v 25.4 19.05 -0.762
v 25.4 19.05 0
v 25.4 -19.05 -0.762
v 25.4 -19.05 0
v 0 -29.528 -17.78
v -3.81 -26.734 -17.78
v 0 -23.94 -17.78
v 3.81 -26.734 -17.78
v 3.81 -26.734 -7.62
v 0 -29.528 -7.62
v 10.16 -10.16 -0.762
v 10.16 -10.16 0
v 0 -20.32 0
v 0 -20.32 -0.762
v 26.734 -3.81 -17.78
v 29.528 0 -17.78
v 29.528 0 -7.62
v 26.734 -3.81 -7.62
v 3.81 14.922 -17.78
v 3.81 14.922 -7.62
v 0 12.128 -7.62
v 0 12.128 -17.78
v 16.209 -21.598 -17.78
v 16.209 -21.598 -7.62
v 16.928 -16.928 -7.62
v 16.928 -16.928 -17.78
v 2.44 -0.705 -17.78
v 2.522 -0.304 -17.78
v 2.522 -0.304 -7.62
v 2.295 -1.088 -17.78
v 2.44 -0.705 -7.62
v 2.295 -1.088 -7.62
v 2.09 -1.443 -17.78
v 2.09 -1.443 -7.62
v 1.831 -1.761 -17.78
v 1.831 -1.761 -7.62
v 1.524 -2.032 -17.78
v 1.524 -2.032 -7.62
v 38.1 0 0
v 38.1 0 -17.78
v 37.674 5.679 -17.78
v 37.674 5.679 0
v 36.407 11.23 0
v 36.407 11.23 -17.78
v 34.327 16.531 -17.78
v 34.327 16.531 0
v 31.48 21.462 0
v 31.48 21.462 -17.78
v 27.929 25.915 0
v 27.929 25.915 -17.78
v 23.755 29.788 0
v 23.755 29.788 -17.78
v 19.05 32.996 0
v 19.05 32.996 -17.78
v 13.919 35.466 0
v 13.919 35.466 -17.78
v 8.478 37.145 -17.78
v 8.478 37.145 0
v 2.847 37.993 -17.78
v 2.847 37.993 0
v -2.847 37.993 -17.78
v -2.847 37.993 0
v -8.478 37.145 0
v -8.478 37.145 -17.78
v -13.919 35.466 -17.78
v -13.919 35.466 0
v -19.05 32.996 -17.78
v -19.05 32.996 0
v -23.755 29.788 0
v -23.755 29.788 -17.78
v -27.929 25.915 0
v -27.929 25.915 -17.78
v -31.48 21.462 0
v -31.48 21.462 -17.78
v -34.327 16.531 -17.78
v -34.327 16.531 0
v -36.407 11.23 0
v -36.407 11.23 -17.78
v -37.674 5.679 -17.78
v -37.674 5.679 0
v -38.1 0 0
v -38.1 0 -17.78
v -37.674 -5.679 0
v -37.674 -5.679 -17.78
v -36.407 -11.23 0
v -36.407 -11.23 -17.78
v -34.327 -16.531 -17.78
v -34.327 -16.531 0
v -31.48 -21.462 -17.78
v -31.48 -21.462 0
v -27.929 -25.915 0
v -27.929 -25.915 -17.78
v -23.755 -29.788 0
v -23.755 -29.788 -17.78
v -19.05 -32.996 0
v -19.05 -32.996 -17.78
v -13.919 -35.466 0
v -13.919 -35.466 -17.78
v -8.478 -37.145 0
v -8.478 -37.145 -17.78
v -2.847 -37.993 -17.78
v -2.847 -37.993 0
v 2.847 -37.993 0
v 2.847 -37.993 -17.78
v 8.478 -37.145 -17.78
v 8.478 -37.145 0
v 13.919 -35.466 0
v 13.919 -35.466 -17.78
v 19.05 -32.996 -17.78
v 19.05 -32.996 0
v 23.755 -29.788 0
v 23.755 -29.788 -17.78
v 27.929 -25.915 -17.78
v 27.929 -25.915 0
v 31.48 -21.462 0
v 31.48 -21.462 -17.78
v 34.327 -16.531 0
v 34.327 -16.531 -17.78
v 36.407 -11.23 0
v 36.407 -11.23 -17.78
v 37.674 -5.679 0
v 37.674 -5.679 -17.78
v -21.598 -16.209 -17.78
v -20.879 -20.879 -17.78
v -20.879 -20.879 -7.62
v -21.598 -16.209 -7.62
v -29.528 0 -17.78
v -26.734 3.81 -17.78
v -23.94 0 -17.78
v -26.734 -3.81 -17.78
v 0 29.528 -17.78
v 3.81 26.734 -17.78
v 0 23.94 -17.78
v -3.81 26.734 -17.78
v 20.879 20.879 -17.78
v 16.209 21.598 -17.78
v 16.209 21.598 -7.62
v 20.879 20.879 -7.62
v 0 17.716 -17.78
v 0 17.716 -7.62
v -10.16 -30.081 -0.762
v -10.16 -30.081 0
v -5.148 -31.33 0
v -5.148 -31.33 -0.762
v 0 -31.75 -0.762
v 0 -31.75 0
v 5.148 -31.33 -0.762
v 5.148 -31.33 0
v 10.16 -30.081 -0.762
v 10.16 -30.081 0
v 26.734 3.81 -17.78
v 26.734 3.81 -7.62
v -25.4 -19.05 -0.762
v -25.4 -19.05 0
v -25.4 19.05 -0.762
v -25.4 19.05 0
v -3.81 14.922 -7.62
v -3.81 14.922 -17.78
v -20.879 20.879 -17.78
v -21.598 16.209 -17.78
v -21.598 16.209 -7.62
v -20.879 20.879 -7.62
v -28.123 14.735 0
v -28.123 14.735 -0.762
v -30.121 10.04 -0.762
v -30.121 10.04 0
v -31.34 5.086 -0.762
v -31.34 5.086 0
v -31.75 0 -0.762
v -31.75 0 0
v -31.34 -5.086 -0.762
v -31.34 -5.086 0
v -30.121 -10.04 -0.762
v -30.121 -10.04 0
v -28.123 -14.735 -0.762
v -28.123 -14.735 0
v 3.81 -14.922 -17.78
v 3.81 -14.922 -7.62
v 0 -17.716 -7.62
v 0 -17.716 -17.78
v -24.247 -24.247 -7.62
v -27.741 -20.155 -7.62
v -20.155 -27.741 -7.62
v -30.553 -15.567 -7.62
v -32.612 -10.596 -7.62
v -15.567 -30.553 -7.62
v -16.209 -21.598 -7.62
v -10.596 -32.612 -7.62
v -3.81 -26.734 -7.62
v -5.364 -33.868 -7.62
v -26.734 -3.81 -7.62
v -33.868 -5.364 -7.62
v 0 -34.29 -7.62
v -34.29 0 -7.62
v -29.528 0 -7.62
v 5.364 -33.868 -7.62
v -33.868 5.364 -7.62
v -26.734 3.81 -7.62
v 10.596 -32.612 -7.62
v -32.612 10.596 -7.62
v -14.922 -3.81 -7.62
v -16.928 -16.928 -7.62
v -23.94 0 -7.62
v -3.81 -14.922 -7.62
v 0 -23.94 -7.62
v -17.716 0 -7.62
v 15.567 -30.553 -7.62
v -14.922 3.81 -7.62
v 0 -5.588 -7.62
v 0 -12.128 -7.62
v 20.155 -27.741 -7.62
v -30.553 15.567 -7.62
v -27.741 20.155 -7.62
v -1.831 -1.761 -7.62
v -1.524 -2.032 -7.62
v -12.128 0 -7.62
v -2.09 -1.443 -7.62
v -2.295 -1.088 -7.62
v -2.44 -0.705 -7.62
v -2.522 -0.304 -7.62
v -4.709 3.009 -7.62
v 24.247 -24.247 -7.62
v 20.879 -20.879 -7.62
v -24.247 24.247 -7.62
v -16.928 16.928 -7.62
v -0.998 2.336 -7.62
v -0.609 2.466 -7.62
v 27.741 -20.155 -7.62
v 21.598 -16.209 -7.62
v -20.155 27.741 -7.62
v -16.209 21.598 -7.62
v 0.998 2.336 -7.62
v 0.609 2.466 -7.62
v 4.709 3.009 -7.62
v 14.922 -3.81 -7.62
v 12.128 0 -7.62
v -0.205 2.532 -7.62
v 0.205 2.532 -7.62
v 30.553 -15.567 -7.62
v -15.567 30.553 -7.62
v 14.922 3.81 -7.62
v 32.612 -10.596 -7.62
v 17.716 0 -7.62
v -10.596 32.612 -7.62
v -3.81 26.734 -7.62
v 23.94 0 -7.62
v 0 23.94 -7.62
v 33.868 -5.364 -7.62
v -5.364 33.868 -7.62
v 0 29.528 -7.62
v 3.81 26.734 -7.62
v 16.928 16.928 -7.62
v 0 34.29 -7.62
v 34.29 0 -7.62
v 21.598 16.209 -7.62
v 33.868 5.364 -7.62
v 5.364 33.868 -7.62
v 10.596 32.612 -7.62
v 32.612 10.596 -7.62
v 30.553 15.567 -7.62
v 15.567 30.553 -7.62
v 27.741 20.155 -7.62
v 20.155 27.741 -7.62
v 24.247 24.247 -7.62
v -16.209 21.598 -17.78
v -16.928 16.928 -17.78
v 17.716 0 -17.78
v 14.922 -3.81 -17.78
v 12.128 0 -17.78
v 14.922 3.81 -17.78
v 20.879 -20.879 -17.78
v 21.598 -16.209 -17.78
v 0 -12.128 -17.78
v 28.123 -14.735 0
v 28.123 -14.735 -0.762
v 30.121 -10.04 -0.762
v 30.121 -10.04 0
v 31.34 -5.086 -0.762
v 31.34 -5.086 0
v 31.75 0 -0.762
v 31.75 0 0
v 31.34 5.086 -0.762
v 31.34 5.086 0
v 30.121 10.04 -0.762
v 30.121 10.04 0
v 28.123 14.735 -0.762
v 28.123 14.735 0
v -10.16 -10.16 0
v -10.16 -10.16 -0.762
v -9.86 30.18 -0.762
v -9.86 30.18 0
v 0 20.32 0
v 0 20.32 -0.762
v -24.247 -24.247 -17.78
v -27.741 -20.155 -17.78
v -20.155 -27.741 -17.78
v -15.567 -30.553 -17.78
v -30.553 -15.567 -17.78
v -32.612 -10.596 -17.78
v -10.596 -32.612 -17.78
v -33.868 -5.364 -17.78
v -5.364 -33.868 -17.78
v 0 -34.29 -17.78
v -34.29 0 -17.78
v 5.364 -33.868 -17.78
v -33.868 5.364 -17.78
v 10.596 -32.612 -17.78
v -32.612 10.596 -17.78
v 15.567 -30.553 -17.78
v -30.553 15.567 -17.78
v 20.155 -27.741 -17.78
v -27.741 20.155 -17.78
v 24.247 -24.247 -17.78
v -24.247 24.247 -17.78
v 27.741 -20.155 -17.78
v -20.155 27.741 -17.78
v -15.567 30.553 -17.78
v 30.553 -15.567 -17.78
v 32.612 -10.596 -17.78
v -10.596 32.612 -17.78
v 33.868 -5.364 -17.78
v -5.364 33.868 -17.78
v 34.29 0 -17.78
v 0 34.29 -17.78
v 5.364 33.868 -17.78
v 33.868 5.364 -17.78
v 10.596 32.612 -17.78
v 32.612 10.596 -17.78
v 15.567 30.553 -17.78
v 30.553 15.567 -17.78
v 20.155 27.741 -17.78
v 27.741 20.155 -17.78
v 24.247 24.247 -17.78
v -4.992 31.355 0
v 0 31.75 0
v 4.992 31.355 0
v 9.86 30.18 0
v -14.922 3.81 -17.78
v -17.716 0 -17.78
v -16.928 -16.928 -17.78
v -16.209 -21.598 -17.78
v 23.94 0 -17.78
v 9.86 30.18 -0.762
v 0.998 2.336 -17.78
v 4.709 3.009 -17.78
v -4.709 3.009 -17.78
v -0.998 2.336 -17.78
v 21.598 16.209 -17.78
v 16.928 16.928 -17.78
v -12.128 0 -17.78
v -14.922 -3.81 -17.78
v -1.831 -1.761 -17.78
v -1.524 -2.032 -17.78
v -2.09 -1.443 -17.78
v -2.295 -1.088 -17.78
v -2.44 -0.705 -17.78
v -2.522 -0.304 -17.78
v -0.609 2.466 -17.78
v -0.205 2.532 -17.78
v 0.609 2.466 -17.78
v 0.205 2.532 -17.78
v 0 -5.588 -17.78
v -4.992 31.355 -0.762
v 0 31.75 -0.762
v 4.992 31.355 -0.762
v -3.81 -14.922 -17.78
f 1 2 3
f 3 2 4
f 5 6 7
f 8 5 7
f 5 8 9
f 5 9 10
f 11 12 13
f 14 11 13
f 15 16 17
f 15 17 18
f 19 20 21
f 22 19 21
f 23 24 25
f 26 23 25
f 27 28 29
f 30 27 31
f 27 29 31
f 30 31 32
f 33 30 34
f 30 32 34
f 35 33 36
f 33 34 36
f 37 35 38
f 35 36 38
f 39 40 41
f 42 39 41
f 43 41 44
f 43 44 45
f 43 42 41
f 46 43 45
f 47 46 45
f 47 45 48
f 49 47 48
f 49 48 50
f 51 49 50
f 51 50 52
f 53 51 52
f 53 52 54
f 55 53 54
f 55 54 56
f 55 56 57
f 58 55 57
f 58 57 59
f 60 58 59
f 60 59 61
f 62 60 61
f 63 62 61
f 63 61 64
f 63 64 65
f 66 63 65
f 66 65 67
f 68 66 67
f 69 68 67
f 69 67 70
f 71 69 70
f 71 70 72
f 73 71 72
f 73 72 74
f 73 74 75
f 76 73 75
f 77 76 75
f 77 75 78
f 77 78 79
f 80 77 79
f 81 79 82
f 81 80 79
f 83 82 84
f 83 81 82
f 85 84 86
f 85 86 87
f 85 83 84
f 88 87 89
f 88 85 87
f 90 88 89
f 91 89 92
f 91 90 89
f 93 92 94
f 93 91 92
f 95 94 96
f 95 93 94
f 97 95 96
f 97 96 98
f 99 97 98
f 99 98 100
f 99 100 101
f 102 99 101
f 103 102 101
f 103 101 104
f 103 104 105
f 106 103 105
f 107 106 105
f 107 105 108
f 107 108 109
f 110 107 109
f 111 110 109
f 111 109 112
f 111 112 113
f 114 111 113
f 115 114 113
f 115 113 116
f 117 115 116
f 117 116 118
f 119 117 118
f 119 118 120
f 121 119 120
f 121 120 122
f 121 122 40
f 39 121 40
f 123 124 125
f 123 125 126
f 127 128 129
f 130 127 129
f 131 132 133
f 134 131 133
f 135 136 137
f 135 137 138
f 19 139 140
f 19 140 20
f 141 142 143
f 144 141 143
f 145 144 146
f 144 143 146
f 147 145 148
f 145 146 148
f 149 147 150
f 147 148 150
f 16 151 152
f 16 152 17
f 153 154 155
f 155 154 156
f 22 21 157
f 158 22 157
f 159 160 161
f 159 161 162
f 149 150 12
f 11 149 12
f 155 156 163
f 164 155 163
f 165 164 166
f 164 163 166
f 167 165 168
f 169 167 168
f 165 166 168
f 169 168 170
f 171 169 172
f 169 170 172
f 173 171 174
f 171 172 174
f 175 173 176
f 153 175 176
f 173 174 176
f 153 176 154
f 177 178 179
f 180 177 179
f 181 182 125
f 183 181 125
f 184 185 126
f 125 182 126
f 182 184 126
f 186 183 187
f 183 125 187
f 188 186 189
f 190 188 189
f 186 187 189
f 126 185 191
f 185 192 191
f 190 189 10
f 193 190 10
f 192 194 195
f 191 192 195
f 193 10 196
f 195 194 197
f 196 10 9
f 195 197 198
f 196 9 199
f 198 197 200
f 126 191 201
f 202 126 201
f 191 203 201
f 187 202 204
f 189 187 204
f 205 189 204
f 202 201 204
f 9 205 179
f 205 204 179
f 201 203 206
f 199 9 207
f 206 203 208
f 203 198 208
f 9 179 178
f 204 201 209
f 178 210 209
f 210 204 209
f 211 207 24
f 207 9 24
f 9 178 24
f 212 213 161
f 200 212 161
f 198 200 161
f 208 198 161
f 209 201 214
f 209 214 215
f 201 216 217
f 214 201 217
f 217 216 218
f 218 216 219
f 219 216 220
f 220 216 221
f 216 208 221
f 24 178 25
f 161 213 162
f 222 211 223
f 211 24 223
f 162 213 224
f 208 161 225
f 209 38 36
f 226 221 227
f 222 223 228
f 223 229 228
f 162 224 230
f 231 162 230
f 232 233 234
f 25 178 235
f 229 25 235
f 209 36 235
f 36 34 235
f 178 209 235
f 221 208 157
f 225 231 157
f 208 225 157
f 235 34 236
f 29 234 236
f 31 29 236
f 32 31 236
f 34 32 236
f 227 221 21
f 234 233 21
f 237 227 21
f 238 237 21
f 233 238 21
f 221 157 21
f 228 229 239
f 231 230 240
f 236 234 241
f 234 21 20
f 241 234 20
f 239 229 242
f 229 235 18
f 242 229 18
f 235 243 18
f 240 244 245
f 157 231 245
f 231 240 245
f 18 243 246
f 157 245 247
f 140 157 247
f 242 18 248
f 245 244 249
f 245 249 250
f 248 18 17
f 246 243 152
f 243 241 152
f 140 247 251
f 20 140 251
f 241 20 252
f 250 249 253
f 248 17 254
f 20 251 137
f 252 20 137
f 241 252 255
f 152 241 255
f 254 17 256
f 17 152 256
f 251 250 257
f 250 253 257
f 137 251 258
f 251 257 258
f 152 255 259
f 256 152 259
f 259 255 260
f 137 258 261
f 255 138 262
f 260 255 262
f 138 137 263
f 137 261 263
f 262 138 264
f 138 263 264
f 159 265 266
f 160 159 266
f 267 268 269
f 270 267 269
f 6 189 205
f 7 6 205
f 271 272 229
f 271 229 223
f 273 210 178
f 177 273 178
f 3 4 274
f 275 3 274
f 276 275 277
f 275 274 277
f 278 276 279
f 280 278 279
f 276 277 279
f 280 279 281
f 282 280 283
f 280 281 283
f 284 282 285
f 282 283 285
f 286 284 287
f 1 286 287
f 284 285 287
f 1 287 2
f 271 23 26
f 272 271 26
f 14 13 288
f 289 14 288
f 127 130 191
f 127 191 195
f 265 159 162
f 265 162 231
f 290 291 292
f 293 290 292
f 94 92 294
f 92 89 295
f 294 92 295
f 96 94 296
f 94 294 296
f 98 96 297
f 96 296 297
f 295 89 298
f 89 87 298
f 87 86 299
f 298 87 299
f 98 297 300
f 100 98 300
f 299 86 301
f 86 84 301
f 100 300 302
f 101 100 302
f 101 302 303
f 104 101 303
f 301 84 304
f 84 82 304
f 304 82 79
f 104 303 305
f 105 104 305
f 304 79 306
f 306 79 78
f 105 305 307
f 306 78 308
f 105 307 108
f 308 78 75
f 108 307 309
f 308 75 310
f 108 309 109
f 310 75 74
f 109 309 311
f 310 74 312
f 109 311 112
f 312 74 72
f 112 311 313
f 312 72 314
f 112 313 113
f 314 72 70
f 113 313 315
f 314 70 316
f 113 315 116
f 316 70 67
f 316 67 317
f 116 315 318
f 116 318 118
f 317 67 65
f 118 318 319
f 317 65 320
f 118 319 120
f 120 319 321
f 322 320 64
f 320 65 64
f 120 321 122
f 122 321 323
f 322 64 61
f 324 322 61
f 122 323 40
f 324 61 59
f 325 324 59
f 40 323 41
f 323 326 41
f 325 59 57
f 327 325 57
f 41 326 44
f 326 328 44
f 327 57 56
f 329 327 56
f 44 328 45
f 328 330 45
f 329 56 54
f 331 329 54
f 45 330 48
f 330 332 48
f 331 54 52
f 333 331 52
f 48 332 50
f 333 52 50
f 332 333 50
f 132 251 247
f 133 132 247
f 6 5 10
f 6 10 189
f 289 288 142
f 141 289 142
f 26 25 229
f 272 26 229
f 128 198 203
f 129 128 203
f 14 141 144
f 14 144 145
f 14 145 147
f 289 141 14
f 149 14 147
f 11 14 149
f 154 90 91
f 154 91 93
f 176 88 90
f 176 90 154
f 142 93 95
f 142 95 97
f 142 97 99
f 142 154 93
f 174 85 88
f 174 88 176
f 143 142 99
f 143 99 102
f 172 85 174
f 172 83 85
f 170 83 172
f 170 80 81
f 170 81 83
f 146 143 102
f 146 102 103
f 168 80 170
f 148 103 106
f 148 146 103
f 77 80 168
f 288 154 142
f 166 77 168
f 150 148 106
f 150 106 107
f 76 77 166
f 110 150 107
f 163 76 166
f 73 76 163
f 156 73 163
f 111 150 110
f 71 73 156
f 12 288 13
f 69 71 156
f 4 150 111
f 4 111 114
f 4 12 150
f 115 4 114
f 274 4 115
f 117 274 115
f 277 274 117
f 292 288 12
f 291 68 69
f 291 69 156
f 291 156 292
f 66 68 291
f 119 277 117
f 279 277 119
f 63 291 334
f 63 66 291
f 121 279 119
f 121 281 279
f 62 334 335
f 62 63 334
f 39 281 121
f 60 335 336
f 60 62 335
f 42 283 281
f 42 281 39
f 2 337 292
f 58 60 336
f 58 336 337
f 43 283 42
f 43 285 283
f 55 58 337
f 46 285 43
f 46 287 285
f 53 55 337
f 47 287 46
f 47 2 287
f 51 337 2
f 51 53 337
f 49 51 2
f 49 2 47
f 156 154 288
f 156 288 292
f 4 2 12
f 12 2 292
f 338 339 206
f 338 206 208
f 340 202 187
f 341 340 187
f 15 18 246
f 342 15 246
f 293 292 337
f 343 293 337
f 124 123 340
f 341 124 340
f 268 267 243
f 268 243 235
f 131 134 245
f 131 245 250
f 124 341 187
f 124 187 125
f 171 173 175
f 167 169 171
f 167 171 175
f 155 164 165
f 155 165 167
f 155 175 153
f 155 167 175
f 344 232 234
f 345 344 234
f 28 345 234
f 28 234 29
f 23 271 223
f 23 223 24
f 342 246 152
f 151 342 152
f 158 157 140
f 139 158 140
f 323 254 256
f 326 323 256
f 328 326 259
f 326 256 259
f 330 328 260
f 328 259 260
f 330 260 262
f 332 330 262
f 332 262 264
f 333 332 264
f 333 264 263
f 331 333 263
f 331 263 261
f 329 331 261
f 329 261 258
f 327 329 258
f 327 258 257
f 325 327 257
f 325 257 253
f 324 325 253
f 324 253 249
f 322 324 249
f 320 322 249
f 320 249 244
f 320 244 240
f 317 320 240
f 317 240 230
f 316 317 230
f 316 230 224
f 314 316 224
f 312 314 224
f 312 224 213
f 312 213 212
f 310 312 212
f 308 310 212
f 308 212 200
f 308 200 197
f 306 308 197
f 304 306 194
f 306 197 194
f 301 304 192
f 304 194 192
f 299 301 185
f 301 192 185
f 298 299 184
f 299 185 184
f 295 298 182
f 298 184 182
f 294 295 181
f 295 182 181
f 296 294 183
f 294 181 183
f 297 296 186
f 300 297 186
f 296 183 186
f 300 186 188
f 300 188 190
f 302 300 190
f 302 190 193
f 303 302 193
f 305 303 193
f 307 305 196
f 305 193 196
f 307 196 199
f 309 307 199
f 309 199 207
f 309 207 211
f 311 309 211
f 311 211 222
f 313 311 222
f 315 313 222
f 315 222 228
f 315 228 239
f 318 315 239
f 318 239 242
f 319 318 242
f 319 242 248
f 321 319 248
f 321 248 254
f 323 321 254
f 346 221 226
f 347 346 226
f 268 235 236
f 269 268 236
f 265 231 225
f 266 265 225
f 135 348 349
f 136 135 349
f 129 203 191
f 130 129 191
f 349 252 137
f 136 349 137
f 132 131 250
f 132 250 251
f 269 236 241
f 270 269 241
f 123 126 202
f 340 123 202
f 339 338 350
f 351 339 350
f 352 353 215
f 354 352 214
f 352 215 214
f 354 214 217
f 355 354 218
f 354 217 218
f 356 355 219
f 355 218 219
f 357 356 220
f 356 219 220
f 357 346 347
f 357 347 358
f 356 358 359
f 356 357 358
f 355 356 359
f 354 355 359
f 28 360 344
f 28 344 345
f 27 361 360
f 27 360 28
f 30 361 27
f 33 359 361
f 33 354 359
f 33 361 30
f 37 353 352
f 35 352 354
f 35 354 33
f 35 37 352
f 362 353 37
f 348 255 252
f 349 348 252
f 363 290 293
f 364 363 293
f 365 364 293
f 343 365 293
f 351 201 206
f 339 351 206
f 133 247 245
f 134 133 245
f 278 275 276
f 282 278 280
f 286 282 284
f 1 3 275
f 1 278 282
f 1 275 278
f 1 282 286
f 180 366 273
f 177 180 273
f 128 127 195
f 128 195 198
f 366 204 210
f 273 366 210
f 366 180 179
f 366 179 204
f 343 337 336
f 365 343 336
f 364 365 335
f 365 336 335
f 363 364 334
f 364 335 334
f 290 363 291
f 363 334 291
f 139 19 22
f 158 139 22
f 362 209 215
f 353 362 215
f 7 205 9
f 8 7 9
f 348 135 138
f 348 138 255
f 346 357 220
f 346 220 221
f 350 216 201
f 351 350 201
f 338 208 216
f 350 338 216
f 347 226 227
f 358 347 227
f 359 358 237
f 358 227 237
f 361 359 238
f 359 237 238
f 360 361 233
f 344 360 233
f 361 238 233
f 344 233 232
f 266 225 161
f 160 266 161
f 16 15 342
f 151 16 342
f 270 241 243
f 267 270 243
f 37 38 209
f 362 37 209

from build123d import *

# Parameters (mm, degrees)
F0_R            = 38.1
F0_R_2          = 34.29
F1_DEPTH        = 7.62
F2_DEPTH        = 17.78
F4_DEPTH        = 10.16
F5_DEPTH        = 10.16
F5_COPIES_COUNT = 4
F6_DEPTH        = 10.16
F6_COPIES_COUNT = 8
F8_DEPTH        = 0.762


# Not quite as in the source:
# - a pattern or mirror of a feature is missing from the dataset's text; its kind, count and spacing are read off the source's solid


with BuildPart() as f1:
    # F0 (on Top) → F1 (new body)
    with BuildSketch(Plane.XY):
        Circle(F0_R)
        Circle(F0_R_2, mode=Mode.SUBTRACT)
        Circle(F0_R_2)
    extrude(amount=-F1_DEPTH)

    # F0 (on Top) → F2 (join)
    with BuildSketch(Plane.XY):
        Circle(F0_R)
        Circle(F0_R_2, mode=Mode.SUBTRACT)
    extrude(amount=-F2_DEPTH)

    # F3 (on face) → F4 (join)
    with BuildSketch(Plane(origin=(0, 0, -7.62), x_dir=(1, 0, 0), z_dir=(0, 0, -1))):
        with BuildLine():
            Line((-4.7088706862, -3.0087008594), (-0.9977636205, -2.3358227154))
            ThreePointArc((-0.9977636205, -2.3358227154), (0, -2.54), (0.9977636205, -2.3358227154))
            Line((0.9977636205, -2.3358227154), (4.7088706862, -3.0087008594))
            Line((4.7088706862, -3.0087008594), (2.5217636205, 0.3038227154))
            ThreePointArc((2.5217636205, 0.3038227154), (2.1997045256, 1.27), (1.524, 2.032))
            Line((1.524, 2.032), (0, 5.588))
            Line((0, 5.588), (-1.524, 2.032))
            ThreePointArc((-1.524, 2.032), (-2.1997045256, 1.27), (-2.5217636205, 0.3038227154))
            Line((-2.5217636205, 0.3038227154), (-4.7088706862, -3.0087008594))
        make_face()
    extrude(amount=F4_DEPTH)

    # F3 (on face) → F5 (join)
    with BuildSketch(Plane(origin=(0, 0, -7.62), x_dir=(1, 0, 0), z_dir=(0, 0, -1))):
        Polygon((3.81, 14.9225), (0, 17.7165), (-3.81, 14.9225), (0, 12.1285), align=None)
    f5 = extrude(amount=F5_DEPTH)

    # F5_copies: F5 ×4 about axis
    f5_copies_axis = Axis((0, 0, 0), (0, 0, 1))
    for i in range(1, F5_COPIES_COUNT):
        add(f5.rotate(f5_copies_axis, i * 360 / F5_COPIES_COUNT))

    # F3 (on face) → F6 (join)
    with BuildSketch(Plane(origin=(0, 0, -7.62), x_dir=(1, 0, 0), z_dir=(0, 0, -1))):
        Polygon((3.81, 26.7335), (0, 29.5275), (-3.81, 26.7335), (0, 23.9395), align=None)
    f6 = extrude(amount=F6_DEPTH)

    # F6_copies: F6 ×8 about axis
    f6_copies_axis = Axis((0, 0, 0), (0, 0, 1))
    for i in range(1, F6_COPIES_COUNT):
        add(f6.rotate(f6_copies_axis, i * 360 / F6_COPIES_COUNT))

    # F7 (on face) → F8 (cut)
    with BuildSketch(Plane.XY):
        with BuildLine():
            Line((-10.16, -10.16), (-10.16, -30.0805069771))
            ThreePointArc((-10.16, -30.0805069771), (0, -31.75), (10.16, -30.0805069771))
            Line((10.16, -30.0805069771), (10.16, -10.16))
            Line((10.16, -10.16), (0, -20.32))
            Line((0, -20.32), (-10.16, -10.16))
        make_face()
        with BuildLine():
            ThreePointArc((-25.4, 19.05), (-31.75, 0), (-25.4, -19.05))
            Line((-25.4, -19.05), (-25.4, 19.05))
        make_face()
        with BuildLine():
            ThreePointArc((25.4, -19.05), (31.75, 0), (25.4, 19.05))
            Line((25.4, 19.05), (25.4, -19.05))
        make_face()
        with BuildLine():
            ThreePointArc((9.8601311185, 30.1801311185), (0, 31.75), (-9.8601311185, 30.1801311185))
            Line((-9.8601311185, 30.1801311185), (0, 20.32))
            Line((0, 20.32), (9.8601311185, 30.1801311185))
        make_face()
    extrude(amount=-F8_DEPTH, mode=Mode.SUBTRACT)


solid = f1.part
